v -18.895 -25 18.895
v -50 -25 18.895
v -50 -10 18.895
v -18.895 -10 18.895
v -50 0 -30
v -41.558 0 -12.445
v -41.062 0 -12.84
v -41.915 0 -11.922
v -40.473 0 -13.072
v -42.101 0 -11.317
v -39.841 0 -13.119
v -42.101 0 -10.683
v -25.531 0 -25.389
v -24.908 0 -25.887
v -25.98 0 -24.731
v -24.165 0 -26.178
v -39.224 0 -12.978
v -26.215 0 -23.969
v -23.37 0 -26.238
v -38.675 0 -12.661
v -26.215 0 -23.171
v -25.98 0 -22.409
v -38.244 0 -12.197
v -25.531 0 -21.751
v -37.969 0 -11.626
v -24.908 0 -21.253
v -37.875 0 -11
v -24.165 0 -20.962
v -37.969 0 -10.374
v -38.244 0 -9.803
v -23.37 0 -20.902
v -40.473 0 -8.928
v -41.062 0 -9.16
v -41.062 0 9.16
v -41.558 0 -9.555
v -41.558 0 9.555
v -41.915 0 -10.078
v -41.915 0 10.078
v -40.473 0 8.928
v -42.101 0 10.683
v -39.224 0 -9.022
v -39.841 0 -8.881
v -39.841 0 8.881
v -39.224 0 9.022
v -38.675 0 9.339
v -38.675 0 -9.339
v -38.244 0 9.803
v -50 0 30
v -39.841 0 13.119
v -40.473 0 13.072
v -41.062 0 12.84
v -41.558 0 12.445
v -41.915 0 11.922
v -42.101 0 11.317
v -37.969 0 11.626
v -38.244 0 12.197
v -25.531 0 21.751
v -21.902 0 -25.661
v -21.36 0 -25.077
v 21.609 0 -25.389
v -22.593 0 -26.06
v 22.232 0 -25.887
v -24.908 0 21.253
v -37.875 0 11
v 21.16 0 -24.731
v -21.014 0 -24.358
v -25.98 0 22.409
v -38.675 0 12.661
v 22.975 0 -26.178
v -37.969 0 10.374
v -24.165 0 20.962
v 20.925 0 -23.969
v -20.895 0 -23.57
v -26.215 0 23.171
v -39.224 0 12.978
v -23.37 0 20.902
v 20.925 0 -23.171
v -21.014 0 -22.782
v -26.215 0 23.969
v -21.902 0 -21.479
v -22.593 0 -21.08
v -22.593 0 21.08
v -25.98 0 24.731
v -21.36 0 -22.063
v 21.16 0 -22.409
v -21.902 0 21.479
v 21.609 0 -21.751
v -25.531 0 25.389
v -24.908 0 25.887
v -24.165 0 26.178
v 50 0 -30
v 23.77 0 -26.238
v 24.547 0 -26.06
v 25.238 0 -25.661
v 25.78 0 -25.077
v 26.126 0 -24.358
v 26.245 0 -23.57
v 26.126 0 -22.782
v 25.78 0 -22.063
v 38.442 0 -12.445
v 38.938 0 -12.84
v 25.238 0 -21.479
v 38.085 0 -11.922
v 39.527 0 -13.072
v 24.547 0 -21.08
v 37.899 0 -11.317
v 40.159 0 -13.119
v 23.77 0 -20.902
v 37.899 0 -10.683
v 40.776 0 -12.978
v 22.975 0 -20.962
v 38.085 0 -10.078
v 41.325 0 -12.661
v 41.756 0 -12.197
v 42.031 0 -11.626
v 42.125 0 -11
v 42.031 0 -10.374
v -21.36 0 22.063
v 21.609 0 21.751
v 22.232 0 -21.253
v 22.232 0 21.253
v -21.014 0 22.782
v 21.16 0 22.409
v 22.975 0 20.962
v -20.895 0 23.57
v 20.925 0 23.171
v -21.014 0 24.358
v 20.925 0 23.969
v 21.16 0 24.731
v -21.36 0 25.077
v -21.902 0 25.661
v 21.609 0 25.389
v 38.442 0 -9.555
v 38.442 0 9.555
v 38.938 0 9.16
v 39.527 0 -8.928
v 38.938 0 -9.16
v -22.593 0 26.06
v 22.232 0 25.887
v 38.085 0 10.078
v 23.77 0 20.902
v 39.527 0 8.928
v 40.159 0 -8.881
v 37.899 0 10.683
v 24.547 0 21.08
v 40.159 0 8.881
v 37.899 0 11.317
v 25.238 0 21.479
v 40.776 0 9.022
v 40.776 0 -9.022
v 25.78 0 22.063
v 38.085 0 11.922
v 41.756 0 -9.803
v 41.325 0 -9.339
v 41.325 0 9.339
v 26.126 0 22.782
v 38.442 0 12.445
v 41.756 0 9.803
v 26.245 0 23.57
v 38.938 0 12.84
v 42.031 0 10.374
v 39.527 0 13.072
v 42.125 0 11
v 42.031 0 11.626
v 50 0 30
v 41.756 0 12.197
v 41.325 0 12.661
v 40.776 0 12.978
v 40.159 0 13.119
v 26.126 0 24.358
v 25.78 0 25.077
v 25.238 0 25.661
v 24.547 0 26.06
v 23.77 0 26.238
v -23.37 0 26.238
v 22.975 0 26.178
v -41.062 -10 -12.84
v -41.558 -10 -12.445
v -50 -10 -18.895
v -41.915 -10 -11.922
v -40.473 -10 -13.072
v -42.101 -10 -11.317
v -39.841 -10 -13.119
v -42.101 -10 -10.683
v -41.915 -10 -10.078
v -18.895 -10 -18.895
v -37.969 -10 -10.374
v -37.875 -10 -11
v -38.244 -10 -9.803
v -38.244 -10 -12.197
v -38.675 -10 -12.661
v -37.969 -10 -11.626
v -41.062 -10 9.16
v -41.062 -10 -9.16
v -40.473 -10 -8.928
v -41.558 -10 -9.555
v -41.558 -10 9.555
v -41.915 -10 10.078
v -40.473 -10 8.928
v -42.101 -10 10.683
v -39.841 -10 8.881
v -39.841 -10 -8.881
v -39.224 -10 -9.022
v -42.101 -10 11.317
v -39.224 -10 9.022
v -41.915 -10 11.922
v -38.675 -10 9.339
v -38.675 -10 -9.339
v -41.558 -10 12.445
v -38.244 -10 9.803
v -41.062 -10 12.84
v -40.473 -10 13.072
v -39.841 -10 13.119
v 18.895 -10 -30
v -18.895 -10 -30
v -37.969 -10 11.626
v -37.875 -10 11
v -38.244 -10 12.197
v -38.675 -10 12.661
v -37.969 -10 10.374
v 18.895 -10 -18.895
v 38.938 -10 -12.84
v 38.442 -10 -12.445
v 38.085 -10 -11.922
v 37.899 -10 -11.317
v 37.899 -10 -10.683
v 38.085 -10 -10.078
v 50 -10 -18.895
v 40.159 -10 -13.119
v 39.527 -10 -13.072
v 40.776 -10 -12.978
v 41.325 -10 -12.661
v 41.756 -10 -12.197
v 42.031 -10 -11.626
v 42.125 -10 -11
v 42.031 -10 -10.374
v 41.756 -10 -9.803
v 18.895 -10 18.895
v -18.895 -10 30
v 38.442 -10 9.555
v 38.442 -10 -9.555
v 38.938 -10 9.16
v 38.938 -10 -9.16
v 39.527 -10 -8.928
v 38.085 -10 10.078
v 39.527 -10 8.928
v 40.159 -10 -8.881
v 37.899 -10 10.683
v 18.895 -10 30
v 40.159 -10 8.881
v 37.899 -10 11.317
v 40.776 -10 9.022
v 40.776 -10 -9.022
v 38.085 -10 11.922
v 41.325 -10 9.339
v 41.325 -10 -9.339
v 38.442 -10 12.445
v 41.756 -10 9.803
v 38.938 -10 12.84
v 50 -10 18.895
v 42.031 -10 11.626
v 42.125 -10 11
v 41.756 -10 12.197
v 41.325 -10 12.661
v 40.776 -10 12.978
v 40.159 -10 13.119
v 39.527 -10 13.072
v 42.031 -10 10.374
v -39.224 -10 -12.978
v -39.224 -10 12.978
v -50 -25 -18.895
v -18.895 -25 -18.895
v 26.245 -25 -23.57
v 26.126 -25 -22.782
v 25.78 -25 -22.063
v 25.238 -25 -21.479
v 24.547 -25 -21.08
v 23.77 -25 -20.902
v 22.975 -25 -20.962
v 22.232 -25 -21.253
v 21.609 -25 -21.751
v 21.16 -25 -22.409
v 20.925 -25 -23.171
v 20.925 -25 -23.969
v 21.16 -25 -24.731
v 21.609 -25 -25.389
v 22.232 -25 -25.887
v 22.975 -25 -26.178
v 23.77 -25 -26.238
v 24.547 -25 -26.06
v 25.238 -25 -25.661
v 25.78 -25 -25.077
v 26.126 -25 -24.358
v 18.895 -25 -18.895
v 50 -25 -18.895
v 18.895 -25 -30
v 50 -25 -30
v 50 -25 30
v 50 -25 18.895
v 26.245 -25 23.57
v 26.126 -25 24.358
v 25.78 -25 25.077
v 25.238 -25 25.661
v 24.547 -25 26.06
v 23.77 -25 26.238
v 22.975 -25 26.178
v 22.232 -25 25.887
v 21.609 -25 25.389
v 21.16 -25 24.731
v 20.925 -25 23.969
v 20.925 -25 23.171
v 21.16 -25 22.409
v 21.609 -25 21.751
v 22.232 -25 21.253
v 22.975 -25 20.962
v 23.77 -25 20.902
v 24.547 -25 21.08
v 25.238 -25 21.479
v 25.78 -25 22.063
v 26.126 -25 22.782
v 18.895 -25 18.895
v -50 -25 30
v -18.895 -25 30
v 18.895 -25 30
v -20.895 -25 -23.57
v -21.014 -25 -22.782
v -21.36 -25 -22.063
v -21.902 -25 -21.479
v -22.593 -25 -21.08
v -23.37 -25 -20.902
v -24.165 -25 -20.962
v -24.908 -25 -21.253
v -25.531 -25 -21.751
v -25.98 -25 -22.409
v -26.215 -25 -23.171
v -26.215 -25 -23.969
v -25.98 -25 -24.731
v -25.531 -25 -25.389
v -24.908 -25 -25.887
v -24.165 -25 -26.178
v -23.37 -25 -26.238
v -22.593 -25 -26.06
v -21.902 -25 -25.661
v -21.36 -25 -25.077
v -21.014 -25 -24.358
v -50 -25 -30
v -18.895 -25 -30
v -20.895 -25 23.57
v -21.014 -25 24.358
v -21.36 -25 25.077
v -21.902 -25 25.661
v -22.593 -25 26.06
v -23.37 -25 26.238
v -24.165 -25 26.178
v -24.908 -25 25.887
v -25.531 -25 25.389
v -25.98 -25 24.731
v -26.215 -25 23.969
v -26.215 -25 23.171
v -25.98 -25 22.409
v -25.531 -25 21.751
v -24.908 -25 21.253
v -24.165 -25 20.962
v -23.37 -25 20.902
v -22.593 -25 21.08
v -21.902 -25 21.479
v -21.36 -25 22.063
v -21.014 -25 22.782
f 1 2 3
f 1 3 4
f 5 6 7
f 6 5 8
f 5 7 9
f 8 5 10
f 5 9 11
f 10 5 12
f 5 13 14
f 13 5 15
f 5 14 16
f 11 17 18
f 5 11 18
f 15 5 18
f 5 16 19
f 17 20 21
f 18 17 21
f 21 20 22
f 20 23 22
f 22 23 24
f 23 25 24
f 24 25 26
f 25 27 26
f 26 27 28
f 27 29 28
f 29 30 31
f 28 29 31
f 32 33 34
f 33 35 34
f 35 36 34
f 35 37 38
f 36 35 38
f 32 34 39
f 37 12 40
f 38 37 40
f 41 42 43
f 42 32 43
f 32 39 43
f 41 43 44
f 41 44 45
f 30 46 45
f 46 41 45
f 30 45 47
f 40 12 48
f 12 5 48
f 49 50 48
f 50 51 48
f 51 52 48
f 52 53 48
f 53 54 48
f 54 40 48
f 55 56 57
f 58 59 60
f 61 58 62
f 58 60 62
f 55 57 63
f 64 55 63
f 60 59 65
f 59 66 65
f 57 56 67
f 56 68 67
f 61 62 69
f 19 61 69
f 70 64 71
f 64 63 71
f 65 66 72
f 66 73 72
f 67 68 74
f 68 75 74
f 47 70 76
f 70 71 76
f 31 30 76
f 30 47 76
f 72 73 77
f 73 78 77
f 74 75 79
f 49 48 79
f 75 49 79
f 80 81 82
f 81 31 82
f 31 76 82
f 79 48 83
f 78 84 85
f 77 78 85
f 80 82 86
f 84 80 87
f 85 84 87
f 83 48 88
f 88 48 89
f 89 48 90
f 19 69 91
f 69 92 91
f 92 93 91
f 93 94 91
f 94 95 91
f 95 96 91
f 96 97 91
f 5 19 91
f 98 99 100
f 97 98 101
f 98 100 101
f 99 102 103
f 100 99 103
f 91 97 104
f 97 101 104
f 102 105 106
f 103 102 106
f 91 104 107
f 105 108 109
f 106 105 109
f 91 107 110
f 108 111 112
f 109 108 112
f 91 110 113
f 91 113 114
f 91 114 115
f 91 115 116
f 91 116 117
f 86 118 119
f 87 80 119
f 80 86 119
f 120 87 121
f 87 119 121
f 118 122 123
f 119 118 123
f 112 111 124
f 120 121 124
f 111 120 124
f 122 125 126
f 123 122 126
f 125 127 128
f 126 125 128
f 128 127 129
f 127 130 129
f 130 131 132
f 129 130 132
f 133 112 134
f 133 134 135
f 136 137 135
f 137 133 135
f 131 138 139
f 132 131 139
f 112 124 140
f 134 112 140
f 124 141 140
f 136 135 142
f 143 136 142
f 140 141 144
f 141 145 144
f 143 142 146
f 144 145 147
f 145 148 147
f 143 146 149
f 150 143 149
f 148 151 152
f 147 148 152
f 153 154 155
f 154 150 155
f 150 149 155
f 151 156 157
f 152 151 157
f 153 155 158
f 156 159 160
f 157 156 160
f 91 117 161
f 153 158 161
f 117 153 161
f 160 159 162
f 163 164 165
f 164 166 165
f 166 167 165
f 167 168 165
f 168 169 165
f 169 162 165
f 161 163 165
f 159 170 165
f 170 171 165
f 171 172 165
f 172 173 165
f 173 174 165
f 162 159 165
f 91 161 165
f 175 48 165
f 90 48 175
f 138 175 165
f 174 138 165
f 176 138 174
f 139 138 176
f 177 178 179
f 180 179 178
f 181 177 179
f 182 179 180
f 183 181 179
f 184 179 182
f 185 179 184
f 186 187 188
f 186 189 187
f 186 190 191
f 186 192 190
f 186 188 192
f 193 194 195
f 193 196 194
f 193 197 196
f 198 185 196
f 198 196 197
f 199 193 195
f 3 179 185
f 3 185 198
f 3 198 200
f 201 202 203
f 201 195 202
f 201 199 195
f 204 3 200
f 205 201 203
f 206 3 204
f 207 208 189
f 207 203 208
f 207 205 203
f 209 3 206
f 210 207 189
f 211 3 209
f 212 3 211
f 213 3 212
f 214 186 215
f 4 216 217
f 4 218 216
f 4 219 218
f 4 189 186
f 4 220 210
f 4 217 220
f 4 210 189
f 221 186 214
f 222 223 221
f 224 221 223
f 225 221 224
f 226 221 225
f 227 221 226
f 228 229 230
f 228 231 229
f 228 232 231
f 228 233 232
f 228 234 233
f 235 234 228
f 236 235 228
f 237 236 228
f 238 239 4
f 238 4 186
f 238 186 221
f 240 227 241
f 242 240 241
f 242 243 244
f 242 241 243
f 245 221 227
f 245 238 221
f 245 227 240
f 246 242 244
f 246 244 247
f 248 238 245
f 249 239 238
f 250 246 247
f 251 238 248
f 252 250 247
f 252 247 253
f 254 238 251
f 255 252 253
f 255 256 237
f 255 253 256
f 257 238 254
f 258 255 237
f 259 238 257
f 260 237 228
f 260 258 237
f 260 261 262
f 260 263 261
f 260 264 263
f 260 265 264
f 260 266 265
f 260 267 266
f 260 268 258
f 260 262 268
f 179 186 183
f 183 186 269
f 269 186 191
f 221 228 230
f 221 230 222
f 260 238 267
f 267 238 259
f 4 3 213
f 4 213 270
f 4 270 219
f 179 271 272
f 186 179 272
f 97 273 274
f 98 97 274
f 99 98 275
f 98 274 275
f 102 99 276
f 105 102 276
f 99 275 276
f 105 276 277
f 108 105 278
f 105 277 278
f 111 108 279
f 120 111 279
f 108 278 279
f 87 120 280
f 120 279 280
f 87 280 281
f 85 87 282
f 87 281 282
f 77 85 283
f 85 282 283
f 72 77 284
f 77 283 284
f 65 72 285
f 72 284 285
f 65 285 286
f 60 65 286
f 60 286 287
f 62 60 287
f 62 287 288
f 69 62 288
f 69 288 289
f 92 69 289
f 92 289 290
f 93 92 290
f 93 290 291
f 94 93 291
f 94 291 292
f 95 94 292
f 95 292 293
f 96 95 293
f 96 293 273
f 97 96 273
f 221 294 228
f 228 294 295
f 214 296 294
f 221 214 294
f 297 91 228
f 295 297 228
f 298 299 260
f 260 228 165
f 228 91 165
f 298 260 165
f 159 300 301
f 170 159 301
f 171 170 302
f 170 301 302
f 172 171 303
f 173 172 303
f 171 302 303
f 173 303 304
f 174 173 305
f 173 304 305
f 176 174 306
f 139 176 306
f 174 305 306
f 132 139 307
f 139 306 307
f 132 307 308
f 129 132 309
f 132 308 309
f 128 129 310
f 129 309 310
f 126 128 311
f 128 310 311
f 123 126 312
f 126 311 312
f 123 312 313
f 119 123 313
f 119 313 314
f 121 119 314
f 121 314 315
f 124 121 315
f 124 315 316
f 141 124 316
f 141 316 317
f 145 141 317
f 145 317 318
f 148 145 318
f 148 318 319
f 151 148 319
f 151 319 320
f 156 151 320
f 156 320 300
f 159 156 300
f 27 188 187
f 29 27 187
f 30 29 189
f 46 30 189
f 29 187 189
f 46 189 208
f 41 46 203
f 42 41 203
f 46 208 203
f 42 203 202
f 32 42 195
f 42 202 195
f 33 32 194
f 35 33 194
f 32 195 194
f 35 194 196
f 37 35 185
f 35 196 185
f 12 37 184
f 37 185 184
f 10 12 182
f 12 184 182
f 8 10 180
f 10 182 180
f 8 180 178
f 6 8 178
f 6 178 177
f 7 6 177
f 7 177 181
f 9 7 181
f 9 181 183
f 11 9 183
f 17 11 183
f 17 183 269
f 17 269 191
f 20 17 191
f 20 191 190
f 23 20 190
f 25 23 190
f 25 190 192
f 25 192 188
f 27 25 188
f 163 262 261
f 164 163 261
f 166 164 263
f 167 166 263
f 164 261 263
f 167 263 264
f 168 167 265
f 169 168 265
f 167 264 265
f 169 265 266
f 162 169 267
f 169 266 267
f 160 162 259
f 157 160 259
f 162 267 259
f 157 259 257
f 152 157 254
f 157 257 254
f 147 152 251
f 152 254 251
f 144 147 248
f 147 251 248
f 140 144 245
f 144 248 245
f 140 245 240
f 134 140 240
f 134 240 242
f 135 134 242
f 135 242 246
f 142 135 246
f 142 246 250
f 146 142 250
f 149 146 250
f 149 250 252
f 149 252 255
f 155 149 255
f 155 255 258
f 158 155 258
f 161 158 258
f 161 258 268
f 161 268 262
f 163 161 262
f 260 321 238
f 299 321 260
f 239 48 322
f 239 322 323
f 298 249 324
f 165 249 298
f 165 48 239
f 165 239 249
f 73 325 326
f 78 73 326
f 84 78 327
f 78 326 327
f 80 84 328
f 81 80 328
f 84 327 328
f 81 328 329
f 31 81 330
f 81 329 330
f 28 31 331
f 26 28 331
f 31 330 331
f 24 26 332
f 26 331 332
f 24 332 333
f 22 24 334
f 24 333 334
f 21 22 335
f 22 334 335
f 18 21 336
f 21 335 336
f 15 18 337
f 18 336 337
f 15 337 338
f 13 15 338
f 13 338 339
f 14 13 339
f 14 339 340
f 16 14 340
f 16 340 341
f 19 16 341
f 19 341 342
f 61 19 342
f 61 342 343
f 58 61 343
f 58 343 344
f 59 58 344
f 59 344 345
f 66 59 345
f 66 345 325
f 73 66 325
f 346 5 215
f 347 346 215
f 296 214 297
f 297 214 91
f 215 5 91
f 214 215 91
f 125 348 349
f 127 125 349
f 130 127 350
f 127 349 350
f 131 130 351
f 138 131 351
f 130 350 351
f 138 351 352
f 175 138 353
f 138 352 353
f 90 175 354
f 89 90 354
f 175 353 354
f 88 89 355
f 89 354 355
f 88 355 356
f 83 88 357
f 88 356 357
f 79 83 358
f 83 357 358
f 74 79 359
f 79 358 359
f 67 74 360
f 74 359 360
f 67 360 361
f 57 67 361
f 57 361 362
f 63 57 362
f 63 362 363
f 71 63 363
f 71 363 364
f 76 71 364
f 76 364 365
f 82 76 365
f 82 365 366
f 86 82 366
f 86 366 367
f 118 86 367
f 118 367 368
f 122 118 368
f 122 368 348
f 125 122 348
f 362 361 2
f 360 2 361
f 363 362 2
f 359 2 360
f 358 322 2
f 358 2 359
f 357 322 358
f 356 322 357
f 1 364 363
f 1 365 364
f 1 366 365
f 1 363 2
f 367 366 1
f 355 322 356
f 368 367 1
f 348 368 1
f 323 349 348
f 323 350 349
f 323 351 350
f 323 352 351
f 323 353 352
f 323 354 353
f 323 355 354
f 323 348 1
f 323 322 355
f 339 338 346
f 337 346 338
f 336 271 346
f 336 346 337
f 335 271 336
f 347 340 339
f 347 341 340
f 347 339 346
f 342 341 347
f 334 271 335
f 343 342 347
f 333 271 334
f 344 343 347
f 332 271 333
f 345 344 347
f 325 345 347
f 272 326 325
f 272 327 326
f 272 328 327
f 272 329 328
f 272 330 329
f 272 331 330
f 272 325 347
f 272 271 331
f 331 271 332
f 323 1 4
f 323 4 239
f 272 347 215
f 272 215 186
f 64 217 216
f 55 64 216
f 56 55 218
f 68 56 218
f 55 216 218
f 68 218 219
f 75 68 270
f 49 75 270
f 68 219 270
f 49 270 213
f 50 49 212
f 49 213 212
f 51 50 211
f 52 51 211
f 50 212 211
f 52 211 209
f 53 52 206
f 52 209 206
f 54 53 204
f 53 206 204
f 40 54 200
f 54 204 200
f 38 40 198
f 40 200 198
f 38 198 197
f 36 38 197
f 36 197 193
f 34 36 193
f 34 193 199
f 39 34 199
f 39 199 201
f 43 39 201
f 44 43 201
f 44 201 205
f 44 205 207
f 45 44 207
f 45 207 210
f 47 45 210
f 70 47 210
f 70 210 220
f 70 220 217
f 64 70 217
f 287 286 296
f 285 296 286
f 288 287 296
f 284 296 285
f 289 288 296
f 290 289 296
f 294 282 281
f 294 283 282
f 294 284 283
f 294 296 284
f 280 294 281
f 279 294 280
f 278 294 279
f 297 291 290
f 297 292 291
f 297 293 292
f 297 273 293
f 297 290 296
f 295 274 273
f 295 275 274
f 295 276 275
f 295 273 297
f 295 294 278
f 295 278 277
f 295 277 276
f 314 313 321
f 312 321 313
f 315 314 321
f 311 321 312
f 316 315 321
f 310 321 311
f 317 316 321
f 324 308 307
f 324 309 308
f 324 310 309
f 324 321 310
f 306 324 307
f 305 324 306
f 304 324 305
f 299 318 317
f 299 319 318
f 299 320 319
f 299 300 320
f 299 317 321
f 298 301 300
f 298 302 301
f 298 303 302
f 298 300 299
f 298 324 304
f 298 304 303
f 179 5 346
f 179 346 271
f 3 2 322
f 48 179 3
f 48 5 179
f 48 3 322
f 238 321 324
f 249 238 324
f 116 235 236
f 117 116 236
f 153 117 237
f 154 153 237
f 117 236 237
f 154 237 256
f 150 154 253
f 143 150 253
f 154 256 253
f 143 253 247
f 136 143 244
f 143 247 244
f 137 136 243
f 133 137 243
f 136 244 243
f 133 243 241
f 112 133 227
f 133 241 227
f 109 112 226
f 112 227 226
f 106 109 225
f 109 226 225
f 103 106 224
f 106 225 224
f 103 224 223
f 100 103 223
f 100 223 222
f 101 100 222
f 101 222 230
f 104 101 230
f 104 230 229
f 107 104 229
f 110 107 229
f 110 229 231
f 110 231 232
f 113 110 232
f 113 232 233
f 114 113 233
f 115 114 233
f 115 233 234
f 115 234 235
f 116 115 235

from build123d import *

# Parameters (mm, degrees)
F0_W     = 100
F0_H     = 60
F1_DEPTH = 25
F3_W     = 100
F3_H     = 37.79
F4_DEPTH = 15
F2_R     = 2.675
F5_DEPTH = 25.001
F6_R     = 2.125
F7_DEPTH = 10.001
F8_W     = 37.79
F8_H     = 60
F9_DEPTH = 15


with BuildPart() as f1:
    # F0 (on Front) → F1 (new body)
    with BuildSketch(Plane.XZ):
        Rectangle(F0_W, F0_H)
    extrude(amount=F1_DEPTH)

    # F3 (on face) → F4 (cut)
    with BuildSketch(Plane.XZ.offset(25)):
        Rectangle(F3_W, F3_H)
    extrude(amount=-F4_DEPTH, mode=Mode.SUBTRACT)

    # F2 (on face) → F5 (cut, through all)
    with BuildSketch(Plane.XZ.offset(25)):
        with Locations((-23.57, 23.57)):
            Circle(F2_R)
        with Locations((23.57, 23.57)):
            Circle(F2_R)
        with Locations((-23.57, -23.57)):
            Circle(F2_R)
        with Locations((23.57, -23.57)):
            Circle(F2_R)
    extrude(amount=-F5_DEPTH, mode=Mode.SUBTRACT)

    # F6 (on face) → F7 (cut, through all)
    with BuildSketch(Plane.XZ.offset(10)):
        with Locations((-40, 11)):
            Circle(F6_R)
        with Locations((-40, -11)):
            Circle(F6_R)
        with Locations((40, 11)):
            Circle(F6_R)
        with Locations((40, -11)):
            Circle(F6_R)
    extrude(amount=-F7_DEPTH, mode=Mode.SUBTRACT)

    # F8 (on face) → F9 (cut)
    with BuildSketch(Plane.XZ.offset(25)):
        Rectangle(F8_W, F8_H)
    extrude(amount=-F9_DEPTH, mode=Mode.SUBTRACT)


solid = f1.part
